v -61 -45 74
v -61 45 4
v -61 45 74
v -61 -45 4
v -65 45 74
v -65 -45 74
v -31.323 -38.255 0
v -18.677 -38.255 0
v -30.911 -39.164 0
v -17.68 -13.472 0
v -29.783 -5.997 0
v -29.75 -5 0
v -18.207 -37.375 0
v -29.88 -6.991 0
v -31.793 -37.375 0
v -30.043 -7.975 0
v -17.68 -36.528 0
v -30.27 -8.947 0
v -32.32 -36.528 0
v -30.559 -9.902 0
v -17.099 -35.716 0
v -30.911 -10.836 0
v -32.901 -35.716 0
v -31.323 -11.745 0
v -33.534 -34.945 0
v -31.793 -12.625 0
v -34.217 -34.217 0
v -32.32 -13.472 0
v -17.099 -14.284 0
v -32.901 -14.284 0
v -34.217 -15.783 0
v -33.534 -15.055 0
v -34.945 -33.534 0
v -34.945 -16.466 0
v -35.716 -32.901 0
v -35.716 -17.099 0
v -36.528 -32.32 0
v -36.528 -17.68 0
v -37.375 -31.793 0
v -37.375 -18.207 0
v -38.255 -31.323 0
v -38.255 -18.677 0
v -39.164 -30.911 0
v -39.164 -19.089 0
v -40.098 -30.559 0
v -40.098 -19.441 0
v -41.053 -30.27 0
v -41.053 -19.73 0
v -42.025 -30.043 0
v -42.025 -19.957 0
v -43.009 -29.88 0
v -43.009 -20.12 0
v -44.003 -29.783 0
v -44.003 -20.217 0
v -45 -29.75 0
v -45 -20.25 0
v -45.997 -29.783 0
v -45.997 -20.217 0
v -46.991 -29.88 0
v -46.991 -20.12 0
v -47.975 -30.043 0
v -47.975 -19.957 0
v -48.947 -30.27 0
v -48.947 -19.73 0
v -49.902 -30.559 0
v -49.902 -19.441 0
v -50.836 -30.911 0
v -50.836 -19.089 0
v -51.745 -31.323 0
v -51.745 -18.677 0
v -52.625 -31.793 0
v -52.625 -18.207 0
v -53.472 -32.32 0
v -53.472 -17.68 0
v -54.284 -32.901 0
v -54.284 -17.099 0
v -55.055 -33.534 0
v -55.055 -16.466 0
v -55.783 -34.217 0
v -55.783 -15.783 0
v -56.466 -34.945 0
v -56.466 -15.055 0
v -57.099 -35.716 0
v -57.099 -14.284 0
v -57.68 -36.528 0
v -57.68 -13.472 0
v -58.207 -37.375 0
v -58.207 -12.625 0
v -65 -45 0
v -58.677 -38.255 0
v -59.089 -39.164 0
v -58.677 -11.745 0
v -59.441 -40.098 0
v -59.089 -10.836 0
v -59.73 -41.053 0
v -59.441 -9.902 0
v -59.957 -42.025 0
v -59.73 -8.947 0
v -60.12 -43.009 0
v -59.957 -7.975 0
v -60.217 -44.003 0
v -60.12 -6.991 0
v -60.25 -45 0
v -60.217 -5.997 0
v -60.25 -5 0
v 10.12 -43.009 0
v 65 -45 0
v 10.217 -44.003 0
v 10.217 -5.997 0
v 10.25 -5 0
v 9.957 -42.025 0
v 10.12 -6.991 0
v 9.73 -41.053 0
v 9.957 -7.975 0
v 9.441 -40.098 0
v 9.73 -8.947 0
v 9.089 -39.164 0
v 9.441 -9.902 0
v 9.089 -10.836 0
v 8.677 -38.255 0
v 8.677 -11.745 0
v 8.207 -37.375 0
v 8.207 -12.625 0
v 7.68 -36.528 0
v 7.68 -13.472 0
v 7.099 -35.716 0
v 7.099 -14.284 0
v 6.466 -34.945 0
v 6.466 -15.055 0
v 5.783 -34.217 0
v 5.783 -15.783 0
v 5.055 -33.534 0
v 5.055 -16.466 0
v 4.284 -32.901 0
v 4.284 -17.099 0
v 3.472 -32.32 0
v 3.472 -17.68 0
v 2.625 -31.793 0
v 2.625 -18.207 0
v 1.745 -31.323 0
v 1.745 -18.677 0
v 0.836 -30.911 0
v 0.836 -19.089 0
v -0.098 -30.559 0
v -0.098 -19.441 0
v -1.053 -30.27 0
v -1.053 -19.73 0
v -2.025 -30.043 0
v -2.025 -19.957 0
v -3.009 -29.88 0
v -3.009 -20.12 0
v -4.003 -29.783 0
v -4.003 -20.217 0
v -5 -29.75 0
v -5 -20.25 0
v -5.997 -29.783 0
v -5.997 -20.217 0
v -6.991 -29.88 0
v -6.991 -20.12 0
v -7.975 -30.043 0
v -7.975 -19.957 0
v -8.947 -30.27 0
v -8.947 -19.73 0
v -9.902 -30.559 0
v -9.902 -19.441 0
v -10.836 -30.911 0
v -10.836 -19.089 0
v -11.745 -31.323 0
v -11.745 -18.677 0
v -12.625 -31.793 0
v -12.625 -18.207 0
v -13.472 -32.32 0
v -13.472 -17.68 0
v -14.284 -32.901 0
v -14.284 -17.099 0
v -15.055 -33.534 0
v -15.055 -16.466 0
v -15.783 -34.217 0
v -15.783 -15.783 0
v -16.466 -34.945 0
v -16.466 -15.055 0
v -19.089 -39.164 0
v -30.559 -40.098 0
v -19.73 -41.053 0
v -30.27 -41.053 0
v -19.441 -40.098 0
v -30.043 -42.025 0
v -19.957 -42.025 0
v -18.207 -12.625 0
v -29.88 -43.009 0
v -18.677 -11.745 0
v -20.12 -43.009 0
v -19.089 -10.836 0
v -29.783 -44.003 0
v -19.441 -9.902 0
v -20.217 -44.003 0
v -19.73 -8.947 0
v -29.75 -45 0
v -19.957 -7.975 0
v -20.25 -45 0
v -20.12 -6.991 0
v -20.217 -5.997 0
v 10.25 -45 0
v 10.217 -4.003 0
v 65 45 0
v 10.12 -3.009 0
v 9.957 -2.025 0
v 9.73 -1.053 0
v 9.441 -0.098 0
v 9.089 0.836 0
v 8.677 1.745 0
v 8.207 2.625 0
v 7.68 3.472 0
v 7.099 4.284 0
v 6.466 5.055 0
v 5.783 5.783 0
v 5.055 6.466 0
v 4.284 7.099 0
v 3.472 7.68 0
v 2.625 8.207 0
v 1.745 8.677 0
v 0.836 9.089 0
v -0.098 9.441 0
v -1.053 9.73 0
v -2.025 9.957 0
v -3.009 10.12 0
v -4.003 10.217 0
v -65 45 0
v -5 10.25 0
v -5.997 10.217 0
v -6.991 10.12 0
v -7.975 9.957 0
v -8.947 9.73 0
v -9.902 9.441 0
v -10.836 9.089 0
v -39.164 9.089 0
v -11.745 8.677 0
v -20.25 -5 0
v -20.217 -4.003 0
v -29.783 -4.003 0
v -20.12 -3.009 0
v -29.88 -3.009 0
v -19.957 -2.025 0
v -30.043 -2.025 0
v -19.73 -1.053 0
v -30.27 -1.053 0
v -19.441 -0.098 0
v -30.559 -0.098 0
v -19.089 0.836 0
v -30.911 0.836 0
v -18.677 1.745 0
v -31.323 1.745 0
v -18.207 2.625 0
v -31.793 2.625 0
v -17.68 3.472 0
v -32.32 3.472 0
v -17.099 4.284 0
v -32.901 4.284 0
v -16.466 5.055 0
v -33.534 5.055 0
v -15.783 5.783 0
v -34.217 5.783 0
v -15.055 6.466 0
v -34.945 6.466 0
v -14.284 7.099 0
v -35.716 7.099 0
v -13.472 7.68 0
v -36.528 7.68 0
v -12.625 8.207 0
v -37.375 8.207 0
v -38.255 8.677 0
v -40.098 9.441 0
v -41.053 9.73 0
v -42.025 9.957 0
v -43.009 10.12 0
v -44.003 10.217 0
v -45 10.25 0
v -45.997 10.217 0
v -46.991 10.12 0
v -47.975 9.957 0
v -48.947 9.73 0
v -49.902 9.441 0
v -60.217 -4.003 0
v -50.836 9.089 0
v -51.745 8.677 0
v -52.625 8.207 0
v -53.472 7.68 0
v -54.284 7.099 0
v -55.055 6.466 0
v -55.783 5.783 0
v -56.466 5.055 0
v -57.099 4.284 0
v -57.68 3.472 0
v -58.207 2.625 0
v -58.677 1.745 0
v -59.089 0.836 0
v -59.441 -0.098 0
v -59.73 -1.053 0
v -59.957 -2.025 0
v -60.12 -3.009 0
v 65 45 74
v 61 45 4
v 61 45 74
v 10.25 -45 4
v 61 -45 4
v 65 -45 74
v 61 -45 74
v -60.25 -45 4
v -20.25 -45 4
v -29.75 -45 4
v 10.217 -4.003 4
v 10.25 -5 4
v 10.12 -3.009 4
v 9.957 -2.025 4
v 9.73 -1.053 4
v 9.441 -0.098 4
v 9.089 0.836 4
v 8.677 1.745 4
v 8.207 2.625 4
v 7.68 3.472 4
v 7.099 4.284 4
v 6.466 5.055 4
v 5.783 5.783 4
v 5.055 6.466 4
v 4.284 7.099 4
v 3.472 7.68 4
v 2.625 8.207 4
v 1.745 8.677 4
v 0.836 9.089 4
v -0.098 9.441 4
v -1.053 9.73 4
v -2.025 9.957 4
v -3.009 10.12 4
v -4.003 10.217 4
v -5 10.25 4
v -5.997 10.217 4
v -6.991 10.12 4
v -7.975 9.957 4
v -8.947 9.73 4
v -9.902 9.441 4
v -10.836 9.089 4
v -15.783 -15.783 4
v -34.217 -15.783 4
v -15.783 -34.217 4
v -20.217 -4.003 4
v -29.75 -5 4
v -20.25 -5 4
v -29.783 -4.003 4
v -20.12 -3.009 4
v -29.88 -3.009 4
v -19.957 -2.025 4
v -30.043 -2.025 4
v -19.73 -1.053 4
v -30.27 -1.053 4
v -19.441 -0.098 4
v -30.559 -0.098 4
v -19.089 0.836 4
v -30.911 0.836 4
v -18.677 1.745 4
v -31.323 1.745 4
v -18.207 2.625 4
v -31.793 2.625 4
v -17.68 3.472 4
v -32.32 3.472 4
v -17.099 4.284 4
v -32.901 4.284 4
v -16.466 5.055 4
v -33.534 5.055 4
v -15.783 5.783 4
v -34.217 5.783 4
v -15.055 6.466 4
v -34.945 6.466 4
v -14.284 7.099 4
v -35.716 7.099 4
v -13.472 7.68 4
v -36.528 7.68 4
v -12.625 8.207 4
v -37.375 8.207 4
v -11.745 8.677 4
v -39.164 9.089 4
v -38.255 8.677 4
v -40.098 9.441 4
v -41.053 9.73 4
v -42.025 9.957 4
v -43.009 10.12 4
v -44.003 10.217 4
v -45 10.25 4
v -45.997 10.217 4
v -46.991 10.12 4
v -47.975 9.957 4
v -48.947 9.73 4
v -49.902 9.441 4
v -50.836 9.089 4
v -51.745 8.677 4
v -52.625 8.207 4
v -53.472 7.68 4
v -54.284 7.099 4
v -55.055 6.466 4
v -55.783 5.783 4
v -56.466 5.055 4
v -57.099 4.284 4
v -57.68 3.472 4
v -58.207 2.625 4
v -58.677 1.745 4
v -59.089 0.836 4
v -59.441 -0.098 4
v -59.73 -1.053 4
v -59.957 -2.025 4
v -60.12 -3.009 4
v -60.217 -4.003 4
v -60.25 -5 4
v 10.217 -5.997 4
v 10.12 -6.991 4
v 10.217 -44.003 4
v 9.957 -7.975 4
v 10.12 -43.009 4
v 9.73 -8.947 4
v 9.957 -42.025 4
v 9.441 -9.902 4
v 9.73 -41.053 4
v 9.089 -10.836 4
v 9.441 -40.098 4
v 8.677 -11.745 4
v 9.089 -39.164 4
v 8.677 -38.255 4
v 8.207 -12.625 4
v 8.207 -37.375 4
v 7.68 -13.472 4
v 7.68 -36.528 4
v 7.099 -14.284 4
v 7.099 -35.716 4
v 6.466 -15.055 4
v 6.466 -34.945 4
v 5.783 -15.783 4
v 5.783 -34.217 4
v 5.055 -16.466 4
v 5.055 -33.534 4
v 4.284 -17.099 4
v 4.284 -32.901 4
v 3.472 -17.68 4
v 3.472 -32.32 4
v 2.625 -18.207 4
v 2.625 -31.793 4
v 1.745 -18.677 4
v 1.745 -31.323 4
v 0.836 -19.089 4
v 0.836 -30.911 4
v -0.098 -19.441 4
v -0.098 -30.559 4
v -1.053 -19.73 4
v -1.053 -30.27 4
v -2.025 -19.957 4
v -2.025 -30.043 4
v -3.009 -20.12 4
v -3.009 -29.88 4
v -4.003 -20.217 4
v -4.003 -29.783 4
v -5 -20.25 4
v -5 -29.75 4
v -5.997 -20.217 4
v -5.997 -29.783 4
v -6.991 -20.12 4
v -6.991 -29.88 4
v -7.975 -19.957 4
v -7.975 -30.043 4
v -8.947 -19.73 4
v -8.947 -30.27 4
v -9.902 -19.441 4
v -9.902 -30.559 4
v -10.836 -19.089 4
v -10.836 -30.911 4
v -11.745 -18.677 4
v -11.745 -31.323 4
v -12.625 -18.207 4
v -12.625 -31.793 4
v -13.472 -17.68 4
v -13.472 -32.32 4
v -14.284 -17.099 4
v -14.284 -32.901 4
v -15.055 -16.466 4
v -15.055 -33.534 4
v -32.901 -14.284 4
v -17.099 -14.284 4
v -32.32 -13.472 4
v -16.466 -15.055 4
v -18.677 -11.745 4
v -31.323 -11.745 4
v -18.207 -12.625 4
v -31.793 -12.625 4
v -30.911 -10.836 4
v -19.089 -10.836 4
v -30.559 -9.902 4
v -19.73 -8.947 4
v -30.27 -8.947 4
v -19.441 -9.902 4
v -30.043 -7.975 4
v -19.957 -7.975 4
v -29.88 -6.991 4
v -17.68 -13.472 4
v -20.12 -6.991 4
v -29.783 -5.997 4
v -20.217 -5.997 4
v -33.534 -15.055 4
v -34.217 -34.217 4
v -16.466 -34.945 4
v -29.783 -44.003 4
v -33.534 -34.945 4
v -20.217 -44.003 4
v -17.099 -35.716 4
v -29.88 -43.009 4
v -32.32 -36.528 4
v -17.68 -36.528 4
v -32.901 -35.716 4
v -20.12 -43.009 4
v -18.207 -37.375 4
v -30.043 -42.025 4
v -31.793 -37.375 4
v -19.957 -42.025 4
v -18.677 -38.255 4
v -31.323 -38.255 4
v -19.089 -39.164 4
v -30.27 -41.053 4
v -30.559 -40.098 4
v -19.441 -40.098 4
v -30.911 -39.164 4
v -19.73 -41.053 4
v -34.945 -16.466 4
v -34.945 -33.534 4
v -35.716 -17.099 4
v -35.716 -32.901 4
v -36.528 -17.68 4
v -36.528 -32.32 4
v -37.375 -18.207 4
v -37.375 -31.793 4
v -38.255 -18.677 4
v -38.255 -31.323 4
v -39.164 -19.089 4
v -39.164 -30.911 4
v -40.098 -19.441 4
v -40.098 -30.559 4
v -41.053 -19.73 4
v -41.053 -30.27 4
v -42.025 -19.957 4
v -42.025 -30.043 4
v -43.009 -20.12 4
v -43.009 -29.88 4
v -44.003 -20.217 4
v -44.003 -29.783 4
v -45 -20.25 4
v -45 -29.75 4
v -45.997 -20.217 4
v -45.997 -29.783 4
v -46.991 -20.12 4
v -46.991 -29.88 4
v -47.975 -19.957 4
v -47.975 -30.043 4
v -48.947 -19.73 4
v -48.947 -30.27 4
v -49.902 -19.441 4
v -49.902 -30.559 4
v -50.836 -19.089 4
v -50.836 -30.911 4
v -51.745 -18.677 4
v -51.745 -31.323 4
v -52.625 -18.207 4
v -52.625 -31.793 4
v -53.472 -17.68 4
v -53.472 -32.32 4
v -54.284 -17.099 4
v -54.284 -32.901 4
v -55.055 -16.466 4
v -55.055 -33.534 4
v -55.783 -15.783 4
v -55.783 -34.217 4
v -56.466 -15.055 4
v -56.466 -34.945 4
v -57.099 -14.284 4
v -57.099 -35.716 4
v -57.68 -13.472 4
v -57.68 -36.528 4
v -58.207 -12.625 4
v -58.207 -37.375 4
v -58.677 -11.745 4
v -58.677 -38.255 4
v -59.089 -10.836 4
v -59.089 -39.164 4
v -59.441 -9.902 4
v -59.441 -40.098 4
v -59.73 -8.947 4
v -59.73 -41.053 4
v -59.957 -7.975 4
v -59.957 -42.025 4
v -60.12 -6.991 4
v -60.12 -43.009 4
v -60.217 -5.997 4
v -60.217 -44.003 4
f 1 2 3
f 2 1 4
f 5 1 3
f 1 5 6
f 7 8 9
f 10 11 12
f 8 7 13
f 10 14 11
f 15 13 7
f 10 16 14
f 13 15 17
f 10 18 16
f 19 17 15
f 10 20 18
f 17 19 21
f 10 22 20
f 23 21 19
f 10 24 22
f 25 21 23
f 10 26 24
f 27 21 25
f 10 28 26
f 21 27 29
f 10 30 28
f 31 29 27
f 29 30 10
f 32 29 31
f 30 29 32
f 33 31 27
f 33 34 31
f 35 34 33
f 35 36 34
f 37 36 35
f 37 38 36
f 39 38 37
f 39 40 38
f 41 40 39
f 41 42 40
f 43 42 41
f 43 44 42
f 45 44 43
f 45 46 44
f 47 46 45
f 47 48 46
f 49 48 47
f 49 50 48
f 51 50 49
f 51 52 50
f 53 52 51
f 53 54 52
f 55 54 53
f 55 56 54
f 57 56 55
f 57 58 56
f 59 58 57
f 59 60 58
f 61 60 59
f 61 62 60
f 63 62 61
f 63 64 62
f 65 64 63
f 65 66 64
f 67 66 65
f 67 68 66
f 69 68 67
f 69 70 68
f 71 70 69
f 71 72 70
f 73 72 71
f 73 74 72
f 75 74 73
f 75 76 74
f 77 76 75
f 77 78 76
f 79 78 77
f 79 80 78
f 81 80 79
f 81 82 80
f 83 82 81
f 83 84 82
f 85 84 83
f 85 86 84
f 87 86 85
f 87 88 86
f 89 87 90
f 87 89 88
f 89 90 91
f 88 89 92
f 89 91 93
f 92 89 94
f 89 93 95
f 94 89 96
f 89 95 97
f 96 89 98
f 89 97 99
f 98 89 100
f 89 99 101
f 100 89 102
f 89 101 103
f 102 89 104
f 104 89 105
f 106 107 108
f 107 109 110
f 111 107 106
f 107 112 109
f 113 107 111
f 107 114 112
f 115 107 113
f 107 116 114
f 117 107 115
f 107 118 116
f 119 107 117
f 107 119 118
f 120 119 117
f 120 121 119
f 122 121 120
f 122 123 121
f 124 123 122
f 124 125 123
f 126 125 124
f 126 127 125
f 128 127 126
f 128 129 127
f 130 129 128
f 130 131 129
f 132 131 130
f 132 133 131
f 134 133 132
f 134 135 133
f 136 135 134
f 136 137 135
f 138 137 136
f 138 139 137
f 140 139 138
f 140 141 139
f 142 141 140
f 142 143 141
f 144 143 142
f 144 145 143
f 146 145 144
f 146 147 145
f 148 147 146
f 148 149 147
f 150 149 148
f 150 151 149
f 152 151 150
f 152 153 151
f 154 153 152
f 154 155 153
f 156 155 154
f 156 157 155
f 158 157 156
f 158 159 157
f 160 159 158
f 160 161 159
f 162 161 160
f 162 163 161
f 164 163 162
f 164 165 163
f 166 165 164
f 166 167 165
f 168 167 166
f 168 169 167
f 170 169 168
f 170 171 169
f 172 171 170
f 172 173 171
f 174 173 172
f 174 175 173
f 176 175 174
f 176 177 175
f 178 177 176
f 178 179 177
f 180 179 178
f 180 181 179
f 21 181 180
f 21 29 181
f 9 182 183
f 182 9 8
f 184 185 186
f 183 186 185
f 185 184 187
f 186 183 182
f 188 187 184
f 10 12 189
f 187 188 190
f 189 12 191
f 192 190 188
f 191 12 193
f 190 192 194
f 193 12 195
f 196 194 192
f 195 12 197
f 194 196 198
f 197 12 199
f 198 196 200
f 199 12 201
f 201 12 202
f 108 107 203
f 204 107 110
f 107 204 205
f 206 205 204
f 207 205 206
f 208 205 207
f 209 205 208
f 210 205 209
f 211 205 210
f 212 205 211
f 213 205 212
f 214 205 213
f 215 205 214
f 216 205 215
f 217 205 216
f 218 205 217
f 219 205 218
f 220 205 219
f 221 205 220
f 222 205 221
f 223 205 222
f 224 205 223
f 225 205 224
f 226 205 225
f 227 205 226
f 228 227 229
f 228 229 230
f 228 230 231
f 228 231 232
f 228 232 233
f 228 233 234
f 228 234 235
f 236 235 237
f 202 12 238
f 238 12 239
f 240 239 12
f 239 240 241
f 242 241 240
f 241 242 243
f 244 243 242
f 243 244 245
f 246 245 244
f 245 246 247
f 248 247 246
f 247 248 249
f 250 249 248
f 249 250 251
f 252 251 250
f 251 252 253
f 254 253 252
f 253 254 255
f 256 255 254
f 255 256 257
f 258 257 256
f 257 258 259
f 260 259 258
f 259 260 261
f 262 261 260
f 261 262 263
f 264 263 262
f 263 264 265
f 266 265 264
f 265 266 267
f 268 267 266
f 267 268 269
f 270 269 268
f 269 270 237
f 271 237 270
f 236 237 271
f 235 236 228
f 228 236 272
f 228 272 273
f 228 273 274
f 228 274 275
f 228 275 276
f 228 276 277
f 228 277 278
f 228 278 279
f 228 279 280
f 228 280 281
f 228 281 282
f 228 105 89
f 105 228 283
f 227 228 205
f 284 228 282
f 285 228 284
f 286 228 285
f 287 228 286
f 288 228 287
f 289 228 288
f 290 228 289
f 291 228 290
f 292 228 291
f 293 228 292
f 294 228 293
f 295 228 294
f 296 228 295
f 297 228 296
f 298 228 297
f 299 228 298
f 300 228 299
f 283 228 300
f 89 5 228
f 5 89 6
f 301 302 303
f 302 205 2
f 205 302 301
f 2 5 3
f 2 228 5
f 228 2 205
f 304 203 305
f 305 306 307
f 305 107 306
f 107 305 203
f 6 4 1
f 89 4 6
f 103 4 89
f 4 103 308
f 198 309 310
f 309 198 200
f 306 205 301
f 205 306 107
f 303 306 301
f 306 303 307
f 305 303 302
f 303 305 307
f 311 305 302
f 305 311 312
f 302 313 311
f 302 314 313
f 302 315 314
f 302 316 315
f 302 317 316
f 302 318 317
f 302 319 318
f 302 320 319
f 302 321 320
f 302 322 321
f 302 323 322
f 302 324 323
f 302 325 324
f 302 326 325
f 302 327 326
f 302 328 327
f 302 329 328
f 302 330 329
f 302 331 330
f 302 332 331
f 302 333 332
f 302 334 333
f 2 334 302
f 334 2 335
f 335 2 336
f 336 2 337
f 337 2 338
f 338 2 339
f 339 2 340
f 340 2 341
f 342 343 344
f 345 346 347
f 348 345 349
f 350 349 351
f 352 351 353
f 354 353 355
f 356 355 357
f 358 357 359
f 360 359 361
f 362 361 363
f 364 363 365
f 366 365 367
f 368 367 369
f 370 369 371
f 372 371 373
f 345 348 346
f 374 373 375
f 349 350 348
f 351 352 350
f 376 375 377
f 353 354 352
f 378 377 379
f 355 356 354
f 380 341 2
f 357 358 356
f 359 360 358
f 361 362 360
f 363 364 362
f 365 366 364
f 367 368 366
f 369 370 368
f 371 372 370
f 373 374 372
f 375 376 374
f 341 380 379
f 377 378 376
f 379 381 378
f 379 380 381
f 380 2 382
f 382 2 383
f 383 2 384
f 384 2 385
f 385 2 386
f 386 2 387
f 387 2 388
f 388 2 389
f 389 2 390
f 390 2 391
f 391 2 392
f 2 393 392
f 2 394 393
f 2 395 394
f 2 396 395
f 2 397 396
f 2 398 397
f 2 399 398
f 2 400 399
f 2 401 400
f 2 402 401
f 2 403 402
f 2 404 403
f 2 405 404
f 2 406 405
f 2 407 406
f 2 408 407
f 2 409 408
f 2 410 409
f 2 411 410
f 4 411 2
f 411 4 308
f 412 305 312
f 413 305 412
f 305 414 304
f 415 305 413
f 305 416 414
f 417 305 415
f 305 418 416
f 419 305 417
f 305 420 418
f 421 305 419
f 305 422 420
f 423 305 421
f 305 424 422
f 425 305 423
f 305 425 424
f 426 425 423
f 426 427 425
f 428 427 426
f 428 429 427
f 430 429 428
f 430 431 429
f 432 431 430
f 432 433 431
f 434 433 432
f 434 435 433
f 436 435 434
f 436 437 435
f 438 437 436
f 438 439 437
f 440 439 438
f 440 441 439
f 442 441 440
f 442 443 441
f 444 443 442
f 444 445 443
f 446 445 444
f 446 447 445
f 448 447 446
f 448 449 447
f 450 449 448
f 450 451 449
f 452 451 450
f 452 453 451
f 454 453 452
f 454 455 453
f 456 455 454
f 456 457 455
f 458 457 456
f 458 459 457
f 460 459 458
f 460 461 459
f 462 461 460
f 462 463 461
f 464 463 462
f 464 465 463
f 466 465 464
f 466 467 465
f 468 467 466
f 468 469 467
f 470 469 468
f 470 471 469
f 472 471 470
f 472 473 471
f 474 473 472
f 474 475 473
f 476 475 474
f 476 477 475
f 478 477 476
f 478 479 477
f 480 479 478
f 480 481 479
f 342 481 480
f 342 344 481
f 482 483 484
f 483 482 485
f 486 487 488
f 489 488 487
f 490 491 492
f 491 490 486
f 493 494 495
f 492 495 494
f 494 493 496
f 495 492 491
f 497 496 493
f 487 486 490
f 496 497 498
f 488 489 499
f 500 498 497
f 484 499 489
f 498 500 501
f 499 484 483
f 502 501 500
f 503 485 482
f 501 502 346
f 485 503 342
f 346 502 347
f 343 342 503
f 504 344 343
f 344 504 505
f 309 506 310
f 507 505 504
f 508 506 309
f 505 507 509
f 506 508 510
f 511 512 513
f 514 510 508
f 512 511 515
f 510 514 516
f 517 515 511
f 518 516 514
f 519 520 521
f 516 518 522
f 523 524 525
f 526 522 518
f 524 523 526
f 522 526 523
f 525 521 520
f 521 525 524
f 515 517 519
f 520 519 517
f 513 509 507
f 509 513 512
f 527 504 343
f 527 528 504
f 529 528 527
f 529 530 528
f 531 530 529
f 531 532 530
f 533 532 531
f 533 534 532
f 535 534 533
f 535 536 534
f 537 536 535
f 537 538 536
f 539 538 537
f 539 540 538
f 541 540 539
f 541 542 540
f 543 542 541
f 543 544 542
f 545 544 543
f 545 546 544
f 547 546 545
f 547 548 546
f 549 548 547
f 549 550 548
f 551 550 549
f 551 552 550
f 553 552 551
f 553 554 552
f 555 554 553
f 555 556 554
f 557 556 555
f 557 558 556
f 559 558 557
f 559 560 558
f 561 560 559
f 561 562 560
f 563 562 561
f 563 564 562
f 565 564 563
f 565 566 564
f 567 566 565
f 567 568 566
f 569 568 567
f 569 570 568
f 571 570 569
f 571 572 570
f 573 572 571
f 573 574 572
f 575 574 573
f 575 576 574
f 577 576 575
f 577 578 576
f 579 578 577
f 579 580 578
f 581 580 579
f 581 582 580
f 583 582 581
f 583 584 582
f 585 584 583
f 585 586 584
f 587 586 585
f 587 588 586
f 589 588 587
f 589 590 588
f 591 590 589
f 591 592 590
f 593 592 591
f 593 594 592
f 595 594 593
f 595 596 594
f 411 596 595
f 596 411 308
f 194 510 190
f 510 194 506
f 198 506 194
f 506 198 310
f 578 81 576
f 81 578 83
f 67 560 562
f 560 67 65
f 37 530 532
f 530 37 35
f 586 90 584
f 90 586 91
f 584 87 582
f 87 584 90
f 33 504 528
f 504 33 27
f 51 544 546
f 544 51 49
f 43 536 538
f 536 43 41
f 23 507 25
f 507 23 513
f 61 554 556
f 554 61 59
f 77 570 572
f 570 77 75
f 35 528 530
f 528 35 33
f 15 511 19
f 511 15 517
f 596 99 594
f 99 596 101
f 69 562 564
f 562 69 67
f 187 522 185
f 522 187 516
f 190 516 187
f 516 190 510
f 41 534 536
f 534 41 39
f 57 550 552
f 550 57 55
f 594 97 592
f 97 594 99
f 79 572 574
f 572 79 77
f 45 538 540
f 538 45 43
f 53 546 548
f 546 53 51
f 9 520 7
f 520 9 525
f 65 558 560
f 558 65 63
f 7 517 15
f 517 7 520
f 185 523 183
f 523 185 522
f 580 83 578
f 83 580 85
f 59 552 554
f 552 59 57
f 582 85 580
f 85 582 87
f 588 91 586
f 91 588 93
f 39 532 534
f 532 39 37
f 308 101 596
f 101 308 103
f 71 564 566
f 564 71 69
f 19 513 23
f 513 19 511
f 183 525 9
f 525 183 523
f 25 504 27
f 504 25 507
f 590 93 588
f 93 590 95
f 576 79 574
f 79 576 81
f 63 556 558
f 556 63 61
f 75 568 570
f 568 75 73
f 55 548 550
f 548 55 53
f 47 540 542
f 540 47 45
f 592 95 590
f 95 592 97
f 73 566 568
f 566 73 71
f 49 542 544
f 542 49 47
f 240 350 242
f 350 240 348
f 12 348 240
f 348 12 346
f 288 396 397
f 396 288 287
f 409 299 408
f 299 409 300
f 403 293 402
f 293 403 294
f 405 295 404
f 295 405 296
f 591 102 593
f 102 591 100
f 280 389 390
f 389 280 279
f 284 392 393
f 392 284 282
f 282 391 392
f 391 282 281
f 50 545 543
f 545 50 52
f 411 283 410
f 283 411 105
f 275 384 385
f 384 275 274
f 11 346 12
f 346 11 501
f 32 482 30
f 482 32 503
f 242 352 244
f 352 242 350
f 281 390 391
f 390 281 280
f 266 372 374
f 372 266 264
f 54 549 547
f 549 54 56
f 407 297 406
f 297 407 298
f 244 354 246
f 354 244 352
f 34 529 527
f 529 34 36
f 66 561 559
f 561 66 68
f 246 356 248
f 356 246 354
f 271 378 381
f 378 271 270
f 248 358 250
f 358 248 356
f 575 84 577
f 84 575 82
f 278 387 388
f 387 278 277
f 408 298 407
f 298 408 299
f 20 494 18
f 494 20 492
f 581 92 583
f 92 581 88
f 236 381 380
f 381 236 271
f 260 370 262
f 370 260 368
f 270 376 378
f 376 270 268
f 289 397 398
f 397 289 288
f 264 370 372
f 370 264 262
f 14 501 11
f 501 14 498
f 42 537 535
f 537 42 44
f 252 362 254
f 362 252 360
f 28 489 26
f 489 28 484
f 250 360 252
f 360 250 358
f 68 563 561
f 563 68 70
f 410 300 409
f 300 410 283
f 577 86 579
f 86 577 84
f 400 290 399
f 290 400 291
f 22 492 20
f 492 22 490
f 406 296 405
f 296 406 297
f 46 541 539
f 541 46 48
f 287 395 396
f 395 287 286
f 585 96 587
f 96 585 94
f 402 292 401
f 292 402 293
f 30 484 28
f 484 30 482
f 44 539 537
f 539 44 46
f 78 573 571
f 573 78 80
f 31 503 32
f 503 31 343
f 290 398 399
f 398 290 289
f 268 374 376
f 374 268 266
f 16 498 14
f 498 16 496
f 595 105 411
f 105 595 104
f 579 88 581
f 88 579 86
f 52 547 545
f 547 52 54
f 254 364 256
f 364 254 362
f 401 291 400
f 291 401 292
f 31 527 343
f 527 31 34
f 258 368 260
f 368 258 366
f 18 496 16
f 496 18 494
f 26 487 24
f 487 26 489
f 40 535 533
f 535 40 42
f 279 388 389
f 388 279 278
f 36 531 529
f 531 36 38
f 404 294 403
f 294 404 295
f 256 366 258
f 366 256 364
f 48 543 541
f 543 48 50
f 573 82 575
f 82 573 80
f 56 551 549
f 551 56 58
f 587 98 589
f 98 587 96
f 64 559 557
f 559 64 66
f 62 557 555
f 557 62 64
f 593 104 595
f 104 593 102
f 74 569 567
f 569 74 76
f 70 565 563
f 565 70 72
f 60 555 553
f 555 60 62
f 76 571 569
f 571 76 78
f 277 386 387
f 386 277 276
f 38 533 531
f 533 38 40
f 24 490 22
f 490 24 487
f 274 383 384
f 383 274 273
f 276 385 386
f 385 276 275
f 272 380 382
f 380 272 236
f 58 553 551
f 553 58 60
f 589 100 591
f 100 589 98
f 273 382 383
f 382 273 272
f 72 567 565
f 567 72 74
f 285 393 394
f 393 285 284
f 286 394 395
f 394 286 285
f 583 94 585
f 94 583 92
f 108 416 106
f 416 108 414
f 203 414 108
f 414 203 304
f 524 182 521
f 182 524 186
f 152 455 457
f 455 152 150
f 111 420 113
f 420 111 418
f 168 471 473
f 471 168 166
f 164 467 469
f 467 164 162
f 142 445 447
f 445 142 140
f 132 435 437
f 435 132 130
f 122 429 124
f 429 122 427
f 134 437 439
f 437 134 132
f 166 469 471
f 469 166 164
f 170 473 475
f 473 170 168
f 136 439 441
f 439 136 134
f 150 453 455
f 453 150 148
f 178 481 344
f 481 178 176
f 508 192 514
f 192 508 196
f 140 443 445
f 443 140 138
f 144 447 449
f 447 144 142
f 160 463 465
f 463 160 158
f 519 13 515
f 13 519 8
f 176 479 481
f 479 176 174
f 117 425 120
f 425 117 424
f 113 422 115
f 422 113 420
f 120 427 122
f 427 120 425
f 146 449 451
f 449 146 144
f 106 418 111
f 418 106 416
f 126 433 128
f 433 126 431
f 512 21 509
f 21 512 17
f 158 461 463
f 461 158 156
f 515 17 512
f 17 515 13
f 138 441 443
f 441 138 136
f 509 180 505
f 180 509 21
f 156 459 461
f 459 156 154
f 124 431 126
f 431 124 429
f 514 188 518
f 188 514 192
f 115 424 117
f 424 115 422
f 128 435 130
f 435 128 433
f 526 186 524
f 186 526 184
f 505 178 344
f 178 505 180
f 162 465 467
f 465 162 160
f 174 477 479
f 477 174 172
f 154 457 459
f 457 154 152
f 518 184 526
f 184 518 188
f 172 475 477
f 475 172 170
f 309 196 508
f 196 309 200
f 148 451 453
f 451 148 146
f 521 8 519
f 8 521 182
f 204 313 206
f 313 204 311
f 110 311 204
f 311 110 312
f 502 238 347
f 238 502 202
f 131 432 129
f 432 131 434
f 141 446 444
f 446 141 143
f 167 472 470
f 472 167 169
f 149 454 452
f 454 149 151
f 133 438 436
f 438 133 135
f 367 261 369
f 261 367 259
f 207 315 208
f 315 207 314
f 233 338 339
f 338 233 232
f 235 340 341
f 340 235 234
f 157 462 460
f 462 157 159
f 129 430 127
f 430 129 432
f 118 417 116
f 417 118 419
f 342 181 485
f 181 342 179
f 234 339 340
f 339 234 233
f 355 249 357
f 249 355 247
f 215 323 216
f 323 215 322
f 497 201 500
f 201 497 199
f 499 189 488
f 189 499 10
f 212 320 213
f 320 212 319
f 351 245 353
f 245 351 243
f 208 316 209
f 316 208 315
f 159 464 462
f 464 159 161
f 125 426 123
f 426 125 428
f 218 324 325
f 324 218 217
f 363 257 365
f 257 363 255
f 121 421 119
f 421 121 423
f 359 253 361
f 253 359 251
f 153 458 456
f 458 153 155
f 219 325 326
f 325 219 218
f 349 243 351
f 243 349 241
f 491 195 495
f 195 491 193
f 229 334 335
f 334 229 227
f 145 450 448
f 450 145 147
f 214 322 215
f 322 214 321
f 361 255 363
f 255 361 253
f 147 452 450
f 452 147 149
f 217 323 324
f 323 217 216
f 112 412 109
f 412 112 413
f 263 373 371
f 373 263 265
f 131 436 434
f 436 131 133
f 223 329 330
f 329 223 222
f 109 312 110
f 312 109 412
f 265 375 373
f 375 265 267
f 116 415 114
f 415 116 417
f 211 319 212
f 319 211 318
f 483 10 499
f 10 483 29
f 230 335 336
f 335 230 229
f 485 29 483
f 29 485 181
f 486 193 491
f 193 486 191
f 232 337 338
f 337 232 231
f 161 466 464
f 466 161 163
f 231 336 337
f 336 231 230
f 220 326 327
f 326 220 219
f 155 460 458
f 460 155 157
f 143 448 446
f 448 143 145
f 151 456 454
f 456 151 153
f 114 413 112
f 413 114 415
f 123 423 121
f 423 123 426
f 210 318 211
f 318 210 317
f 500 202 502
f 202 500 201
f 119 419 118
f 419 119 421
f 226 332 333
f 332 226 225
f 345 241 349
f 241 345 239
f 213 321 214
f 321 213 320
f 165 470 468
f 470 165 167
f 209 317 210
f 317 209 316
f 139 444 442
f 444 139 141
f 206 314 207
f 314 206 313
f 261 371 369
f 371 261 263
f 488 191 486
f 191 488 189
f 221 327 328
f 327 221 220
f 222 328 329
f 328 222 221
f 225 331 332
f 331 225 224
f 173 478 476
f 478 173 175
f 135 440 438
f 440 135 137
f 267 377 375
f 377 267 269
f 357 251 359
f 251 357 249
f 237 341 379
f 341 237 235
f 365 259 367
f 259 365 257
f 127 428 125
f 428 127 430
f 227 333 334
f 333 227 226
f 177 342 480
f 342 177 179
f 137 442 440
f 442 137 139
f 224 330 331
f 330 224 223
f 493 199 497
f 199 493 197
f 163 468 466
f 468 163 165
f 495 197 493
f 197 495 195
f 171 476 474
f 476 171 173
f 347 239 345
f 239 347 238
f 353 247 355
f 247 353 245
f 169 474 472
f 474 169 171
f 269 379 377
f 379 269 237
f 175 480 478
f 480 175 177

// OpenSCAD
// 6 x 50 mL conical tube rack (Falcon-type)
// Print orientation: flat plate on bed, walls rising up.
// After printing, flip the part so it stands on the walls.

// ---------- Parameters ----------
plate_x      = 130;   // plate length along X (mm)
plate_y      = 90;    // plate width along Y (mm)
plate_t      = 4;     // plate thickness (mm), z = 0 to 4
wall_h       = 70;    // wall height above plate top (mm), z = 4 to 74
wall_t       = 4;     // wall thickness along Y (mm)
hole_d       = 30.5;  // tube hole diameter (mm)
hole_nx      = 3;     // holes per row along X
hole_ny      = 2;     // number of rows along Y
hole_pitch_x = 40;    // centre-to-centre spacing along X (mm)
hole_pitch_y = 40;    // centre-to-centre spacing along Y (mm)
eps          = 0.5;   // cutter overshoot past faces (mm)

$fn = 96;

// ---------- Model ----------
difference() {
    union() {
        // Base plate
        translate([-plate_x/2, -plate_y/2, 0])
            cube([plate_x, plate_y, plate_t]);

        // Two solid walls along the long edges, flush with the plate
        for (sx = [-1, 1])
            translate([sx > 0 ? plate_x/2 - wall_t : -plate_x/2,
                       -plate_y/2,
                       0])
                cube([wall_t, plate_y, wall_h + plate_t]);
    }

    // Tube through-holes, centred on the plate
    for (i = [0 : hole_nx - 1])
        for (j = [0 : hole_ny - 1])
            translate([(i - (hole_nx - 1)/2) * hole_pitch_x - plate_x/2 + hole_pitch_x/2,
                       (j - (hole_ny - 1)/2) * hole_pitch_y - plate_y/2 + hole_pitch_y/2,
                       -eps])
                cylinder(d = hole_d, h = plate_t + wall_h + 2*eps, $fn = 96);
}
